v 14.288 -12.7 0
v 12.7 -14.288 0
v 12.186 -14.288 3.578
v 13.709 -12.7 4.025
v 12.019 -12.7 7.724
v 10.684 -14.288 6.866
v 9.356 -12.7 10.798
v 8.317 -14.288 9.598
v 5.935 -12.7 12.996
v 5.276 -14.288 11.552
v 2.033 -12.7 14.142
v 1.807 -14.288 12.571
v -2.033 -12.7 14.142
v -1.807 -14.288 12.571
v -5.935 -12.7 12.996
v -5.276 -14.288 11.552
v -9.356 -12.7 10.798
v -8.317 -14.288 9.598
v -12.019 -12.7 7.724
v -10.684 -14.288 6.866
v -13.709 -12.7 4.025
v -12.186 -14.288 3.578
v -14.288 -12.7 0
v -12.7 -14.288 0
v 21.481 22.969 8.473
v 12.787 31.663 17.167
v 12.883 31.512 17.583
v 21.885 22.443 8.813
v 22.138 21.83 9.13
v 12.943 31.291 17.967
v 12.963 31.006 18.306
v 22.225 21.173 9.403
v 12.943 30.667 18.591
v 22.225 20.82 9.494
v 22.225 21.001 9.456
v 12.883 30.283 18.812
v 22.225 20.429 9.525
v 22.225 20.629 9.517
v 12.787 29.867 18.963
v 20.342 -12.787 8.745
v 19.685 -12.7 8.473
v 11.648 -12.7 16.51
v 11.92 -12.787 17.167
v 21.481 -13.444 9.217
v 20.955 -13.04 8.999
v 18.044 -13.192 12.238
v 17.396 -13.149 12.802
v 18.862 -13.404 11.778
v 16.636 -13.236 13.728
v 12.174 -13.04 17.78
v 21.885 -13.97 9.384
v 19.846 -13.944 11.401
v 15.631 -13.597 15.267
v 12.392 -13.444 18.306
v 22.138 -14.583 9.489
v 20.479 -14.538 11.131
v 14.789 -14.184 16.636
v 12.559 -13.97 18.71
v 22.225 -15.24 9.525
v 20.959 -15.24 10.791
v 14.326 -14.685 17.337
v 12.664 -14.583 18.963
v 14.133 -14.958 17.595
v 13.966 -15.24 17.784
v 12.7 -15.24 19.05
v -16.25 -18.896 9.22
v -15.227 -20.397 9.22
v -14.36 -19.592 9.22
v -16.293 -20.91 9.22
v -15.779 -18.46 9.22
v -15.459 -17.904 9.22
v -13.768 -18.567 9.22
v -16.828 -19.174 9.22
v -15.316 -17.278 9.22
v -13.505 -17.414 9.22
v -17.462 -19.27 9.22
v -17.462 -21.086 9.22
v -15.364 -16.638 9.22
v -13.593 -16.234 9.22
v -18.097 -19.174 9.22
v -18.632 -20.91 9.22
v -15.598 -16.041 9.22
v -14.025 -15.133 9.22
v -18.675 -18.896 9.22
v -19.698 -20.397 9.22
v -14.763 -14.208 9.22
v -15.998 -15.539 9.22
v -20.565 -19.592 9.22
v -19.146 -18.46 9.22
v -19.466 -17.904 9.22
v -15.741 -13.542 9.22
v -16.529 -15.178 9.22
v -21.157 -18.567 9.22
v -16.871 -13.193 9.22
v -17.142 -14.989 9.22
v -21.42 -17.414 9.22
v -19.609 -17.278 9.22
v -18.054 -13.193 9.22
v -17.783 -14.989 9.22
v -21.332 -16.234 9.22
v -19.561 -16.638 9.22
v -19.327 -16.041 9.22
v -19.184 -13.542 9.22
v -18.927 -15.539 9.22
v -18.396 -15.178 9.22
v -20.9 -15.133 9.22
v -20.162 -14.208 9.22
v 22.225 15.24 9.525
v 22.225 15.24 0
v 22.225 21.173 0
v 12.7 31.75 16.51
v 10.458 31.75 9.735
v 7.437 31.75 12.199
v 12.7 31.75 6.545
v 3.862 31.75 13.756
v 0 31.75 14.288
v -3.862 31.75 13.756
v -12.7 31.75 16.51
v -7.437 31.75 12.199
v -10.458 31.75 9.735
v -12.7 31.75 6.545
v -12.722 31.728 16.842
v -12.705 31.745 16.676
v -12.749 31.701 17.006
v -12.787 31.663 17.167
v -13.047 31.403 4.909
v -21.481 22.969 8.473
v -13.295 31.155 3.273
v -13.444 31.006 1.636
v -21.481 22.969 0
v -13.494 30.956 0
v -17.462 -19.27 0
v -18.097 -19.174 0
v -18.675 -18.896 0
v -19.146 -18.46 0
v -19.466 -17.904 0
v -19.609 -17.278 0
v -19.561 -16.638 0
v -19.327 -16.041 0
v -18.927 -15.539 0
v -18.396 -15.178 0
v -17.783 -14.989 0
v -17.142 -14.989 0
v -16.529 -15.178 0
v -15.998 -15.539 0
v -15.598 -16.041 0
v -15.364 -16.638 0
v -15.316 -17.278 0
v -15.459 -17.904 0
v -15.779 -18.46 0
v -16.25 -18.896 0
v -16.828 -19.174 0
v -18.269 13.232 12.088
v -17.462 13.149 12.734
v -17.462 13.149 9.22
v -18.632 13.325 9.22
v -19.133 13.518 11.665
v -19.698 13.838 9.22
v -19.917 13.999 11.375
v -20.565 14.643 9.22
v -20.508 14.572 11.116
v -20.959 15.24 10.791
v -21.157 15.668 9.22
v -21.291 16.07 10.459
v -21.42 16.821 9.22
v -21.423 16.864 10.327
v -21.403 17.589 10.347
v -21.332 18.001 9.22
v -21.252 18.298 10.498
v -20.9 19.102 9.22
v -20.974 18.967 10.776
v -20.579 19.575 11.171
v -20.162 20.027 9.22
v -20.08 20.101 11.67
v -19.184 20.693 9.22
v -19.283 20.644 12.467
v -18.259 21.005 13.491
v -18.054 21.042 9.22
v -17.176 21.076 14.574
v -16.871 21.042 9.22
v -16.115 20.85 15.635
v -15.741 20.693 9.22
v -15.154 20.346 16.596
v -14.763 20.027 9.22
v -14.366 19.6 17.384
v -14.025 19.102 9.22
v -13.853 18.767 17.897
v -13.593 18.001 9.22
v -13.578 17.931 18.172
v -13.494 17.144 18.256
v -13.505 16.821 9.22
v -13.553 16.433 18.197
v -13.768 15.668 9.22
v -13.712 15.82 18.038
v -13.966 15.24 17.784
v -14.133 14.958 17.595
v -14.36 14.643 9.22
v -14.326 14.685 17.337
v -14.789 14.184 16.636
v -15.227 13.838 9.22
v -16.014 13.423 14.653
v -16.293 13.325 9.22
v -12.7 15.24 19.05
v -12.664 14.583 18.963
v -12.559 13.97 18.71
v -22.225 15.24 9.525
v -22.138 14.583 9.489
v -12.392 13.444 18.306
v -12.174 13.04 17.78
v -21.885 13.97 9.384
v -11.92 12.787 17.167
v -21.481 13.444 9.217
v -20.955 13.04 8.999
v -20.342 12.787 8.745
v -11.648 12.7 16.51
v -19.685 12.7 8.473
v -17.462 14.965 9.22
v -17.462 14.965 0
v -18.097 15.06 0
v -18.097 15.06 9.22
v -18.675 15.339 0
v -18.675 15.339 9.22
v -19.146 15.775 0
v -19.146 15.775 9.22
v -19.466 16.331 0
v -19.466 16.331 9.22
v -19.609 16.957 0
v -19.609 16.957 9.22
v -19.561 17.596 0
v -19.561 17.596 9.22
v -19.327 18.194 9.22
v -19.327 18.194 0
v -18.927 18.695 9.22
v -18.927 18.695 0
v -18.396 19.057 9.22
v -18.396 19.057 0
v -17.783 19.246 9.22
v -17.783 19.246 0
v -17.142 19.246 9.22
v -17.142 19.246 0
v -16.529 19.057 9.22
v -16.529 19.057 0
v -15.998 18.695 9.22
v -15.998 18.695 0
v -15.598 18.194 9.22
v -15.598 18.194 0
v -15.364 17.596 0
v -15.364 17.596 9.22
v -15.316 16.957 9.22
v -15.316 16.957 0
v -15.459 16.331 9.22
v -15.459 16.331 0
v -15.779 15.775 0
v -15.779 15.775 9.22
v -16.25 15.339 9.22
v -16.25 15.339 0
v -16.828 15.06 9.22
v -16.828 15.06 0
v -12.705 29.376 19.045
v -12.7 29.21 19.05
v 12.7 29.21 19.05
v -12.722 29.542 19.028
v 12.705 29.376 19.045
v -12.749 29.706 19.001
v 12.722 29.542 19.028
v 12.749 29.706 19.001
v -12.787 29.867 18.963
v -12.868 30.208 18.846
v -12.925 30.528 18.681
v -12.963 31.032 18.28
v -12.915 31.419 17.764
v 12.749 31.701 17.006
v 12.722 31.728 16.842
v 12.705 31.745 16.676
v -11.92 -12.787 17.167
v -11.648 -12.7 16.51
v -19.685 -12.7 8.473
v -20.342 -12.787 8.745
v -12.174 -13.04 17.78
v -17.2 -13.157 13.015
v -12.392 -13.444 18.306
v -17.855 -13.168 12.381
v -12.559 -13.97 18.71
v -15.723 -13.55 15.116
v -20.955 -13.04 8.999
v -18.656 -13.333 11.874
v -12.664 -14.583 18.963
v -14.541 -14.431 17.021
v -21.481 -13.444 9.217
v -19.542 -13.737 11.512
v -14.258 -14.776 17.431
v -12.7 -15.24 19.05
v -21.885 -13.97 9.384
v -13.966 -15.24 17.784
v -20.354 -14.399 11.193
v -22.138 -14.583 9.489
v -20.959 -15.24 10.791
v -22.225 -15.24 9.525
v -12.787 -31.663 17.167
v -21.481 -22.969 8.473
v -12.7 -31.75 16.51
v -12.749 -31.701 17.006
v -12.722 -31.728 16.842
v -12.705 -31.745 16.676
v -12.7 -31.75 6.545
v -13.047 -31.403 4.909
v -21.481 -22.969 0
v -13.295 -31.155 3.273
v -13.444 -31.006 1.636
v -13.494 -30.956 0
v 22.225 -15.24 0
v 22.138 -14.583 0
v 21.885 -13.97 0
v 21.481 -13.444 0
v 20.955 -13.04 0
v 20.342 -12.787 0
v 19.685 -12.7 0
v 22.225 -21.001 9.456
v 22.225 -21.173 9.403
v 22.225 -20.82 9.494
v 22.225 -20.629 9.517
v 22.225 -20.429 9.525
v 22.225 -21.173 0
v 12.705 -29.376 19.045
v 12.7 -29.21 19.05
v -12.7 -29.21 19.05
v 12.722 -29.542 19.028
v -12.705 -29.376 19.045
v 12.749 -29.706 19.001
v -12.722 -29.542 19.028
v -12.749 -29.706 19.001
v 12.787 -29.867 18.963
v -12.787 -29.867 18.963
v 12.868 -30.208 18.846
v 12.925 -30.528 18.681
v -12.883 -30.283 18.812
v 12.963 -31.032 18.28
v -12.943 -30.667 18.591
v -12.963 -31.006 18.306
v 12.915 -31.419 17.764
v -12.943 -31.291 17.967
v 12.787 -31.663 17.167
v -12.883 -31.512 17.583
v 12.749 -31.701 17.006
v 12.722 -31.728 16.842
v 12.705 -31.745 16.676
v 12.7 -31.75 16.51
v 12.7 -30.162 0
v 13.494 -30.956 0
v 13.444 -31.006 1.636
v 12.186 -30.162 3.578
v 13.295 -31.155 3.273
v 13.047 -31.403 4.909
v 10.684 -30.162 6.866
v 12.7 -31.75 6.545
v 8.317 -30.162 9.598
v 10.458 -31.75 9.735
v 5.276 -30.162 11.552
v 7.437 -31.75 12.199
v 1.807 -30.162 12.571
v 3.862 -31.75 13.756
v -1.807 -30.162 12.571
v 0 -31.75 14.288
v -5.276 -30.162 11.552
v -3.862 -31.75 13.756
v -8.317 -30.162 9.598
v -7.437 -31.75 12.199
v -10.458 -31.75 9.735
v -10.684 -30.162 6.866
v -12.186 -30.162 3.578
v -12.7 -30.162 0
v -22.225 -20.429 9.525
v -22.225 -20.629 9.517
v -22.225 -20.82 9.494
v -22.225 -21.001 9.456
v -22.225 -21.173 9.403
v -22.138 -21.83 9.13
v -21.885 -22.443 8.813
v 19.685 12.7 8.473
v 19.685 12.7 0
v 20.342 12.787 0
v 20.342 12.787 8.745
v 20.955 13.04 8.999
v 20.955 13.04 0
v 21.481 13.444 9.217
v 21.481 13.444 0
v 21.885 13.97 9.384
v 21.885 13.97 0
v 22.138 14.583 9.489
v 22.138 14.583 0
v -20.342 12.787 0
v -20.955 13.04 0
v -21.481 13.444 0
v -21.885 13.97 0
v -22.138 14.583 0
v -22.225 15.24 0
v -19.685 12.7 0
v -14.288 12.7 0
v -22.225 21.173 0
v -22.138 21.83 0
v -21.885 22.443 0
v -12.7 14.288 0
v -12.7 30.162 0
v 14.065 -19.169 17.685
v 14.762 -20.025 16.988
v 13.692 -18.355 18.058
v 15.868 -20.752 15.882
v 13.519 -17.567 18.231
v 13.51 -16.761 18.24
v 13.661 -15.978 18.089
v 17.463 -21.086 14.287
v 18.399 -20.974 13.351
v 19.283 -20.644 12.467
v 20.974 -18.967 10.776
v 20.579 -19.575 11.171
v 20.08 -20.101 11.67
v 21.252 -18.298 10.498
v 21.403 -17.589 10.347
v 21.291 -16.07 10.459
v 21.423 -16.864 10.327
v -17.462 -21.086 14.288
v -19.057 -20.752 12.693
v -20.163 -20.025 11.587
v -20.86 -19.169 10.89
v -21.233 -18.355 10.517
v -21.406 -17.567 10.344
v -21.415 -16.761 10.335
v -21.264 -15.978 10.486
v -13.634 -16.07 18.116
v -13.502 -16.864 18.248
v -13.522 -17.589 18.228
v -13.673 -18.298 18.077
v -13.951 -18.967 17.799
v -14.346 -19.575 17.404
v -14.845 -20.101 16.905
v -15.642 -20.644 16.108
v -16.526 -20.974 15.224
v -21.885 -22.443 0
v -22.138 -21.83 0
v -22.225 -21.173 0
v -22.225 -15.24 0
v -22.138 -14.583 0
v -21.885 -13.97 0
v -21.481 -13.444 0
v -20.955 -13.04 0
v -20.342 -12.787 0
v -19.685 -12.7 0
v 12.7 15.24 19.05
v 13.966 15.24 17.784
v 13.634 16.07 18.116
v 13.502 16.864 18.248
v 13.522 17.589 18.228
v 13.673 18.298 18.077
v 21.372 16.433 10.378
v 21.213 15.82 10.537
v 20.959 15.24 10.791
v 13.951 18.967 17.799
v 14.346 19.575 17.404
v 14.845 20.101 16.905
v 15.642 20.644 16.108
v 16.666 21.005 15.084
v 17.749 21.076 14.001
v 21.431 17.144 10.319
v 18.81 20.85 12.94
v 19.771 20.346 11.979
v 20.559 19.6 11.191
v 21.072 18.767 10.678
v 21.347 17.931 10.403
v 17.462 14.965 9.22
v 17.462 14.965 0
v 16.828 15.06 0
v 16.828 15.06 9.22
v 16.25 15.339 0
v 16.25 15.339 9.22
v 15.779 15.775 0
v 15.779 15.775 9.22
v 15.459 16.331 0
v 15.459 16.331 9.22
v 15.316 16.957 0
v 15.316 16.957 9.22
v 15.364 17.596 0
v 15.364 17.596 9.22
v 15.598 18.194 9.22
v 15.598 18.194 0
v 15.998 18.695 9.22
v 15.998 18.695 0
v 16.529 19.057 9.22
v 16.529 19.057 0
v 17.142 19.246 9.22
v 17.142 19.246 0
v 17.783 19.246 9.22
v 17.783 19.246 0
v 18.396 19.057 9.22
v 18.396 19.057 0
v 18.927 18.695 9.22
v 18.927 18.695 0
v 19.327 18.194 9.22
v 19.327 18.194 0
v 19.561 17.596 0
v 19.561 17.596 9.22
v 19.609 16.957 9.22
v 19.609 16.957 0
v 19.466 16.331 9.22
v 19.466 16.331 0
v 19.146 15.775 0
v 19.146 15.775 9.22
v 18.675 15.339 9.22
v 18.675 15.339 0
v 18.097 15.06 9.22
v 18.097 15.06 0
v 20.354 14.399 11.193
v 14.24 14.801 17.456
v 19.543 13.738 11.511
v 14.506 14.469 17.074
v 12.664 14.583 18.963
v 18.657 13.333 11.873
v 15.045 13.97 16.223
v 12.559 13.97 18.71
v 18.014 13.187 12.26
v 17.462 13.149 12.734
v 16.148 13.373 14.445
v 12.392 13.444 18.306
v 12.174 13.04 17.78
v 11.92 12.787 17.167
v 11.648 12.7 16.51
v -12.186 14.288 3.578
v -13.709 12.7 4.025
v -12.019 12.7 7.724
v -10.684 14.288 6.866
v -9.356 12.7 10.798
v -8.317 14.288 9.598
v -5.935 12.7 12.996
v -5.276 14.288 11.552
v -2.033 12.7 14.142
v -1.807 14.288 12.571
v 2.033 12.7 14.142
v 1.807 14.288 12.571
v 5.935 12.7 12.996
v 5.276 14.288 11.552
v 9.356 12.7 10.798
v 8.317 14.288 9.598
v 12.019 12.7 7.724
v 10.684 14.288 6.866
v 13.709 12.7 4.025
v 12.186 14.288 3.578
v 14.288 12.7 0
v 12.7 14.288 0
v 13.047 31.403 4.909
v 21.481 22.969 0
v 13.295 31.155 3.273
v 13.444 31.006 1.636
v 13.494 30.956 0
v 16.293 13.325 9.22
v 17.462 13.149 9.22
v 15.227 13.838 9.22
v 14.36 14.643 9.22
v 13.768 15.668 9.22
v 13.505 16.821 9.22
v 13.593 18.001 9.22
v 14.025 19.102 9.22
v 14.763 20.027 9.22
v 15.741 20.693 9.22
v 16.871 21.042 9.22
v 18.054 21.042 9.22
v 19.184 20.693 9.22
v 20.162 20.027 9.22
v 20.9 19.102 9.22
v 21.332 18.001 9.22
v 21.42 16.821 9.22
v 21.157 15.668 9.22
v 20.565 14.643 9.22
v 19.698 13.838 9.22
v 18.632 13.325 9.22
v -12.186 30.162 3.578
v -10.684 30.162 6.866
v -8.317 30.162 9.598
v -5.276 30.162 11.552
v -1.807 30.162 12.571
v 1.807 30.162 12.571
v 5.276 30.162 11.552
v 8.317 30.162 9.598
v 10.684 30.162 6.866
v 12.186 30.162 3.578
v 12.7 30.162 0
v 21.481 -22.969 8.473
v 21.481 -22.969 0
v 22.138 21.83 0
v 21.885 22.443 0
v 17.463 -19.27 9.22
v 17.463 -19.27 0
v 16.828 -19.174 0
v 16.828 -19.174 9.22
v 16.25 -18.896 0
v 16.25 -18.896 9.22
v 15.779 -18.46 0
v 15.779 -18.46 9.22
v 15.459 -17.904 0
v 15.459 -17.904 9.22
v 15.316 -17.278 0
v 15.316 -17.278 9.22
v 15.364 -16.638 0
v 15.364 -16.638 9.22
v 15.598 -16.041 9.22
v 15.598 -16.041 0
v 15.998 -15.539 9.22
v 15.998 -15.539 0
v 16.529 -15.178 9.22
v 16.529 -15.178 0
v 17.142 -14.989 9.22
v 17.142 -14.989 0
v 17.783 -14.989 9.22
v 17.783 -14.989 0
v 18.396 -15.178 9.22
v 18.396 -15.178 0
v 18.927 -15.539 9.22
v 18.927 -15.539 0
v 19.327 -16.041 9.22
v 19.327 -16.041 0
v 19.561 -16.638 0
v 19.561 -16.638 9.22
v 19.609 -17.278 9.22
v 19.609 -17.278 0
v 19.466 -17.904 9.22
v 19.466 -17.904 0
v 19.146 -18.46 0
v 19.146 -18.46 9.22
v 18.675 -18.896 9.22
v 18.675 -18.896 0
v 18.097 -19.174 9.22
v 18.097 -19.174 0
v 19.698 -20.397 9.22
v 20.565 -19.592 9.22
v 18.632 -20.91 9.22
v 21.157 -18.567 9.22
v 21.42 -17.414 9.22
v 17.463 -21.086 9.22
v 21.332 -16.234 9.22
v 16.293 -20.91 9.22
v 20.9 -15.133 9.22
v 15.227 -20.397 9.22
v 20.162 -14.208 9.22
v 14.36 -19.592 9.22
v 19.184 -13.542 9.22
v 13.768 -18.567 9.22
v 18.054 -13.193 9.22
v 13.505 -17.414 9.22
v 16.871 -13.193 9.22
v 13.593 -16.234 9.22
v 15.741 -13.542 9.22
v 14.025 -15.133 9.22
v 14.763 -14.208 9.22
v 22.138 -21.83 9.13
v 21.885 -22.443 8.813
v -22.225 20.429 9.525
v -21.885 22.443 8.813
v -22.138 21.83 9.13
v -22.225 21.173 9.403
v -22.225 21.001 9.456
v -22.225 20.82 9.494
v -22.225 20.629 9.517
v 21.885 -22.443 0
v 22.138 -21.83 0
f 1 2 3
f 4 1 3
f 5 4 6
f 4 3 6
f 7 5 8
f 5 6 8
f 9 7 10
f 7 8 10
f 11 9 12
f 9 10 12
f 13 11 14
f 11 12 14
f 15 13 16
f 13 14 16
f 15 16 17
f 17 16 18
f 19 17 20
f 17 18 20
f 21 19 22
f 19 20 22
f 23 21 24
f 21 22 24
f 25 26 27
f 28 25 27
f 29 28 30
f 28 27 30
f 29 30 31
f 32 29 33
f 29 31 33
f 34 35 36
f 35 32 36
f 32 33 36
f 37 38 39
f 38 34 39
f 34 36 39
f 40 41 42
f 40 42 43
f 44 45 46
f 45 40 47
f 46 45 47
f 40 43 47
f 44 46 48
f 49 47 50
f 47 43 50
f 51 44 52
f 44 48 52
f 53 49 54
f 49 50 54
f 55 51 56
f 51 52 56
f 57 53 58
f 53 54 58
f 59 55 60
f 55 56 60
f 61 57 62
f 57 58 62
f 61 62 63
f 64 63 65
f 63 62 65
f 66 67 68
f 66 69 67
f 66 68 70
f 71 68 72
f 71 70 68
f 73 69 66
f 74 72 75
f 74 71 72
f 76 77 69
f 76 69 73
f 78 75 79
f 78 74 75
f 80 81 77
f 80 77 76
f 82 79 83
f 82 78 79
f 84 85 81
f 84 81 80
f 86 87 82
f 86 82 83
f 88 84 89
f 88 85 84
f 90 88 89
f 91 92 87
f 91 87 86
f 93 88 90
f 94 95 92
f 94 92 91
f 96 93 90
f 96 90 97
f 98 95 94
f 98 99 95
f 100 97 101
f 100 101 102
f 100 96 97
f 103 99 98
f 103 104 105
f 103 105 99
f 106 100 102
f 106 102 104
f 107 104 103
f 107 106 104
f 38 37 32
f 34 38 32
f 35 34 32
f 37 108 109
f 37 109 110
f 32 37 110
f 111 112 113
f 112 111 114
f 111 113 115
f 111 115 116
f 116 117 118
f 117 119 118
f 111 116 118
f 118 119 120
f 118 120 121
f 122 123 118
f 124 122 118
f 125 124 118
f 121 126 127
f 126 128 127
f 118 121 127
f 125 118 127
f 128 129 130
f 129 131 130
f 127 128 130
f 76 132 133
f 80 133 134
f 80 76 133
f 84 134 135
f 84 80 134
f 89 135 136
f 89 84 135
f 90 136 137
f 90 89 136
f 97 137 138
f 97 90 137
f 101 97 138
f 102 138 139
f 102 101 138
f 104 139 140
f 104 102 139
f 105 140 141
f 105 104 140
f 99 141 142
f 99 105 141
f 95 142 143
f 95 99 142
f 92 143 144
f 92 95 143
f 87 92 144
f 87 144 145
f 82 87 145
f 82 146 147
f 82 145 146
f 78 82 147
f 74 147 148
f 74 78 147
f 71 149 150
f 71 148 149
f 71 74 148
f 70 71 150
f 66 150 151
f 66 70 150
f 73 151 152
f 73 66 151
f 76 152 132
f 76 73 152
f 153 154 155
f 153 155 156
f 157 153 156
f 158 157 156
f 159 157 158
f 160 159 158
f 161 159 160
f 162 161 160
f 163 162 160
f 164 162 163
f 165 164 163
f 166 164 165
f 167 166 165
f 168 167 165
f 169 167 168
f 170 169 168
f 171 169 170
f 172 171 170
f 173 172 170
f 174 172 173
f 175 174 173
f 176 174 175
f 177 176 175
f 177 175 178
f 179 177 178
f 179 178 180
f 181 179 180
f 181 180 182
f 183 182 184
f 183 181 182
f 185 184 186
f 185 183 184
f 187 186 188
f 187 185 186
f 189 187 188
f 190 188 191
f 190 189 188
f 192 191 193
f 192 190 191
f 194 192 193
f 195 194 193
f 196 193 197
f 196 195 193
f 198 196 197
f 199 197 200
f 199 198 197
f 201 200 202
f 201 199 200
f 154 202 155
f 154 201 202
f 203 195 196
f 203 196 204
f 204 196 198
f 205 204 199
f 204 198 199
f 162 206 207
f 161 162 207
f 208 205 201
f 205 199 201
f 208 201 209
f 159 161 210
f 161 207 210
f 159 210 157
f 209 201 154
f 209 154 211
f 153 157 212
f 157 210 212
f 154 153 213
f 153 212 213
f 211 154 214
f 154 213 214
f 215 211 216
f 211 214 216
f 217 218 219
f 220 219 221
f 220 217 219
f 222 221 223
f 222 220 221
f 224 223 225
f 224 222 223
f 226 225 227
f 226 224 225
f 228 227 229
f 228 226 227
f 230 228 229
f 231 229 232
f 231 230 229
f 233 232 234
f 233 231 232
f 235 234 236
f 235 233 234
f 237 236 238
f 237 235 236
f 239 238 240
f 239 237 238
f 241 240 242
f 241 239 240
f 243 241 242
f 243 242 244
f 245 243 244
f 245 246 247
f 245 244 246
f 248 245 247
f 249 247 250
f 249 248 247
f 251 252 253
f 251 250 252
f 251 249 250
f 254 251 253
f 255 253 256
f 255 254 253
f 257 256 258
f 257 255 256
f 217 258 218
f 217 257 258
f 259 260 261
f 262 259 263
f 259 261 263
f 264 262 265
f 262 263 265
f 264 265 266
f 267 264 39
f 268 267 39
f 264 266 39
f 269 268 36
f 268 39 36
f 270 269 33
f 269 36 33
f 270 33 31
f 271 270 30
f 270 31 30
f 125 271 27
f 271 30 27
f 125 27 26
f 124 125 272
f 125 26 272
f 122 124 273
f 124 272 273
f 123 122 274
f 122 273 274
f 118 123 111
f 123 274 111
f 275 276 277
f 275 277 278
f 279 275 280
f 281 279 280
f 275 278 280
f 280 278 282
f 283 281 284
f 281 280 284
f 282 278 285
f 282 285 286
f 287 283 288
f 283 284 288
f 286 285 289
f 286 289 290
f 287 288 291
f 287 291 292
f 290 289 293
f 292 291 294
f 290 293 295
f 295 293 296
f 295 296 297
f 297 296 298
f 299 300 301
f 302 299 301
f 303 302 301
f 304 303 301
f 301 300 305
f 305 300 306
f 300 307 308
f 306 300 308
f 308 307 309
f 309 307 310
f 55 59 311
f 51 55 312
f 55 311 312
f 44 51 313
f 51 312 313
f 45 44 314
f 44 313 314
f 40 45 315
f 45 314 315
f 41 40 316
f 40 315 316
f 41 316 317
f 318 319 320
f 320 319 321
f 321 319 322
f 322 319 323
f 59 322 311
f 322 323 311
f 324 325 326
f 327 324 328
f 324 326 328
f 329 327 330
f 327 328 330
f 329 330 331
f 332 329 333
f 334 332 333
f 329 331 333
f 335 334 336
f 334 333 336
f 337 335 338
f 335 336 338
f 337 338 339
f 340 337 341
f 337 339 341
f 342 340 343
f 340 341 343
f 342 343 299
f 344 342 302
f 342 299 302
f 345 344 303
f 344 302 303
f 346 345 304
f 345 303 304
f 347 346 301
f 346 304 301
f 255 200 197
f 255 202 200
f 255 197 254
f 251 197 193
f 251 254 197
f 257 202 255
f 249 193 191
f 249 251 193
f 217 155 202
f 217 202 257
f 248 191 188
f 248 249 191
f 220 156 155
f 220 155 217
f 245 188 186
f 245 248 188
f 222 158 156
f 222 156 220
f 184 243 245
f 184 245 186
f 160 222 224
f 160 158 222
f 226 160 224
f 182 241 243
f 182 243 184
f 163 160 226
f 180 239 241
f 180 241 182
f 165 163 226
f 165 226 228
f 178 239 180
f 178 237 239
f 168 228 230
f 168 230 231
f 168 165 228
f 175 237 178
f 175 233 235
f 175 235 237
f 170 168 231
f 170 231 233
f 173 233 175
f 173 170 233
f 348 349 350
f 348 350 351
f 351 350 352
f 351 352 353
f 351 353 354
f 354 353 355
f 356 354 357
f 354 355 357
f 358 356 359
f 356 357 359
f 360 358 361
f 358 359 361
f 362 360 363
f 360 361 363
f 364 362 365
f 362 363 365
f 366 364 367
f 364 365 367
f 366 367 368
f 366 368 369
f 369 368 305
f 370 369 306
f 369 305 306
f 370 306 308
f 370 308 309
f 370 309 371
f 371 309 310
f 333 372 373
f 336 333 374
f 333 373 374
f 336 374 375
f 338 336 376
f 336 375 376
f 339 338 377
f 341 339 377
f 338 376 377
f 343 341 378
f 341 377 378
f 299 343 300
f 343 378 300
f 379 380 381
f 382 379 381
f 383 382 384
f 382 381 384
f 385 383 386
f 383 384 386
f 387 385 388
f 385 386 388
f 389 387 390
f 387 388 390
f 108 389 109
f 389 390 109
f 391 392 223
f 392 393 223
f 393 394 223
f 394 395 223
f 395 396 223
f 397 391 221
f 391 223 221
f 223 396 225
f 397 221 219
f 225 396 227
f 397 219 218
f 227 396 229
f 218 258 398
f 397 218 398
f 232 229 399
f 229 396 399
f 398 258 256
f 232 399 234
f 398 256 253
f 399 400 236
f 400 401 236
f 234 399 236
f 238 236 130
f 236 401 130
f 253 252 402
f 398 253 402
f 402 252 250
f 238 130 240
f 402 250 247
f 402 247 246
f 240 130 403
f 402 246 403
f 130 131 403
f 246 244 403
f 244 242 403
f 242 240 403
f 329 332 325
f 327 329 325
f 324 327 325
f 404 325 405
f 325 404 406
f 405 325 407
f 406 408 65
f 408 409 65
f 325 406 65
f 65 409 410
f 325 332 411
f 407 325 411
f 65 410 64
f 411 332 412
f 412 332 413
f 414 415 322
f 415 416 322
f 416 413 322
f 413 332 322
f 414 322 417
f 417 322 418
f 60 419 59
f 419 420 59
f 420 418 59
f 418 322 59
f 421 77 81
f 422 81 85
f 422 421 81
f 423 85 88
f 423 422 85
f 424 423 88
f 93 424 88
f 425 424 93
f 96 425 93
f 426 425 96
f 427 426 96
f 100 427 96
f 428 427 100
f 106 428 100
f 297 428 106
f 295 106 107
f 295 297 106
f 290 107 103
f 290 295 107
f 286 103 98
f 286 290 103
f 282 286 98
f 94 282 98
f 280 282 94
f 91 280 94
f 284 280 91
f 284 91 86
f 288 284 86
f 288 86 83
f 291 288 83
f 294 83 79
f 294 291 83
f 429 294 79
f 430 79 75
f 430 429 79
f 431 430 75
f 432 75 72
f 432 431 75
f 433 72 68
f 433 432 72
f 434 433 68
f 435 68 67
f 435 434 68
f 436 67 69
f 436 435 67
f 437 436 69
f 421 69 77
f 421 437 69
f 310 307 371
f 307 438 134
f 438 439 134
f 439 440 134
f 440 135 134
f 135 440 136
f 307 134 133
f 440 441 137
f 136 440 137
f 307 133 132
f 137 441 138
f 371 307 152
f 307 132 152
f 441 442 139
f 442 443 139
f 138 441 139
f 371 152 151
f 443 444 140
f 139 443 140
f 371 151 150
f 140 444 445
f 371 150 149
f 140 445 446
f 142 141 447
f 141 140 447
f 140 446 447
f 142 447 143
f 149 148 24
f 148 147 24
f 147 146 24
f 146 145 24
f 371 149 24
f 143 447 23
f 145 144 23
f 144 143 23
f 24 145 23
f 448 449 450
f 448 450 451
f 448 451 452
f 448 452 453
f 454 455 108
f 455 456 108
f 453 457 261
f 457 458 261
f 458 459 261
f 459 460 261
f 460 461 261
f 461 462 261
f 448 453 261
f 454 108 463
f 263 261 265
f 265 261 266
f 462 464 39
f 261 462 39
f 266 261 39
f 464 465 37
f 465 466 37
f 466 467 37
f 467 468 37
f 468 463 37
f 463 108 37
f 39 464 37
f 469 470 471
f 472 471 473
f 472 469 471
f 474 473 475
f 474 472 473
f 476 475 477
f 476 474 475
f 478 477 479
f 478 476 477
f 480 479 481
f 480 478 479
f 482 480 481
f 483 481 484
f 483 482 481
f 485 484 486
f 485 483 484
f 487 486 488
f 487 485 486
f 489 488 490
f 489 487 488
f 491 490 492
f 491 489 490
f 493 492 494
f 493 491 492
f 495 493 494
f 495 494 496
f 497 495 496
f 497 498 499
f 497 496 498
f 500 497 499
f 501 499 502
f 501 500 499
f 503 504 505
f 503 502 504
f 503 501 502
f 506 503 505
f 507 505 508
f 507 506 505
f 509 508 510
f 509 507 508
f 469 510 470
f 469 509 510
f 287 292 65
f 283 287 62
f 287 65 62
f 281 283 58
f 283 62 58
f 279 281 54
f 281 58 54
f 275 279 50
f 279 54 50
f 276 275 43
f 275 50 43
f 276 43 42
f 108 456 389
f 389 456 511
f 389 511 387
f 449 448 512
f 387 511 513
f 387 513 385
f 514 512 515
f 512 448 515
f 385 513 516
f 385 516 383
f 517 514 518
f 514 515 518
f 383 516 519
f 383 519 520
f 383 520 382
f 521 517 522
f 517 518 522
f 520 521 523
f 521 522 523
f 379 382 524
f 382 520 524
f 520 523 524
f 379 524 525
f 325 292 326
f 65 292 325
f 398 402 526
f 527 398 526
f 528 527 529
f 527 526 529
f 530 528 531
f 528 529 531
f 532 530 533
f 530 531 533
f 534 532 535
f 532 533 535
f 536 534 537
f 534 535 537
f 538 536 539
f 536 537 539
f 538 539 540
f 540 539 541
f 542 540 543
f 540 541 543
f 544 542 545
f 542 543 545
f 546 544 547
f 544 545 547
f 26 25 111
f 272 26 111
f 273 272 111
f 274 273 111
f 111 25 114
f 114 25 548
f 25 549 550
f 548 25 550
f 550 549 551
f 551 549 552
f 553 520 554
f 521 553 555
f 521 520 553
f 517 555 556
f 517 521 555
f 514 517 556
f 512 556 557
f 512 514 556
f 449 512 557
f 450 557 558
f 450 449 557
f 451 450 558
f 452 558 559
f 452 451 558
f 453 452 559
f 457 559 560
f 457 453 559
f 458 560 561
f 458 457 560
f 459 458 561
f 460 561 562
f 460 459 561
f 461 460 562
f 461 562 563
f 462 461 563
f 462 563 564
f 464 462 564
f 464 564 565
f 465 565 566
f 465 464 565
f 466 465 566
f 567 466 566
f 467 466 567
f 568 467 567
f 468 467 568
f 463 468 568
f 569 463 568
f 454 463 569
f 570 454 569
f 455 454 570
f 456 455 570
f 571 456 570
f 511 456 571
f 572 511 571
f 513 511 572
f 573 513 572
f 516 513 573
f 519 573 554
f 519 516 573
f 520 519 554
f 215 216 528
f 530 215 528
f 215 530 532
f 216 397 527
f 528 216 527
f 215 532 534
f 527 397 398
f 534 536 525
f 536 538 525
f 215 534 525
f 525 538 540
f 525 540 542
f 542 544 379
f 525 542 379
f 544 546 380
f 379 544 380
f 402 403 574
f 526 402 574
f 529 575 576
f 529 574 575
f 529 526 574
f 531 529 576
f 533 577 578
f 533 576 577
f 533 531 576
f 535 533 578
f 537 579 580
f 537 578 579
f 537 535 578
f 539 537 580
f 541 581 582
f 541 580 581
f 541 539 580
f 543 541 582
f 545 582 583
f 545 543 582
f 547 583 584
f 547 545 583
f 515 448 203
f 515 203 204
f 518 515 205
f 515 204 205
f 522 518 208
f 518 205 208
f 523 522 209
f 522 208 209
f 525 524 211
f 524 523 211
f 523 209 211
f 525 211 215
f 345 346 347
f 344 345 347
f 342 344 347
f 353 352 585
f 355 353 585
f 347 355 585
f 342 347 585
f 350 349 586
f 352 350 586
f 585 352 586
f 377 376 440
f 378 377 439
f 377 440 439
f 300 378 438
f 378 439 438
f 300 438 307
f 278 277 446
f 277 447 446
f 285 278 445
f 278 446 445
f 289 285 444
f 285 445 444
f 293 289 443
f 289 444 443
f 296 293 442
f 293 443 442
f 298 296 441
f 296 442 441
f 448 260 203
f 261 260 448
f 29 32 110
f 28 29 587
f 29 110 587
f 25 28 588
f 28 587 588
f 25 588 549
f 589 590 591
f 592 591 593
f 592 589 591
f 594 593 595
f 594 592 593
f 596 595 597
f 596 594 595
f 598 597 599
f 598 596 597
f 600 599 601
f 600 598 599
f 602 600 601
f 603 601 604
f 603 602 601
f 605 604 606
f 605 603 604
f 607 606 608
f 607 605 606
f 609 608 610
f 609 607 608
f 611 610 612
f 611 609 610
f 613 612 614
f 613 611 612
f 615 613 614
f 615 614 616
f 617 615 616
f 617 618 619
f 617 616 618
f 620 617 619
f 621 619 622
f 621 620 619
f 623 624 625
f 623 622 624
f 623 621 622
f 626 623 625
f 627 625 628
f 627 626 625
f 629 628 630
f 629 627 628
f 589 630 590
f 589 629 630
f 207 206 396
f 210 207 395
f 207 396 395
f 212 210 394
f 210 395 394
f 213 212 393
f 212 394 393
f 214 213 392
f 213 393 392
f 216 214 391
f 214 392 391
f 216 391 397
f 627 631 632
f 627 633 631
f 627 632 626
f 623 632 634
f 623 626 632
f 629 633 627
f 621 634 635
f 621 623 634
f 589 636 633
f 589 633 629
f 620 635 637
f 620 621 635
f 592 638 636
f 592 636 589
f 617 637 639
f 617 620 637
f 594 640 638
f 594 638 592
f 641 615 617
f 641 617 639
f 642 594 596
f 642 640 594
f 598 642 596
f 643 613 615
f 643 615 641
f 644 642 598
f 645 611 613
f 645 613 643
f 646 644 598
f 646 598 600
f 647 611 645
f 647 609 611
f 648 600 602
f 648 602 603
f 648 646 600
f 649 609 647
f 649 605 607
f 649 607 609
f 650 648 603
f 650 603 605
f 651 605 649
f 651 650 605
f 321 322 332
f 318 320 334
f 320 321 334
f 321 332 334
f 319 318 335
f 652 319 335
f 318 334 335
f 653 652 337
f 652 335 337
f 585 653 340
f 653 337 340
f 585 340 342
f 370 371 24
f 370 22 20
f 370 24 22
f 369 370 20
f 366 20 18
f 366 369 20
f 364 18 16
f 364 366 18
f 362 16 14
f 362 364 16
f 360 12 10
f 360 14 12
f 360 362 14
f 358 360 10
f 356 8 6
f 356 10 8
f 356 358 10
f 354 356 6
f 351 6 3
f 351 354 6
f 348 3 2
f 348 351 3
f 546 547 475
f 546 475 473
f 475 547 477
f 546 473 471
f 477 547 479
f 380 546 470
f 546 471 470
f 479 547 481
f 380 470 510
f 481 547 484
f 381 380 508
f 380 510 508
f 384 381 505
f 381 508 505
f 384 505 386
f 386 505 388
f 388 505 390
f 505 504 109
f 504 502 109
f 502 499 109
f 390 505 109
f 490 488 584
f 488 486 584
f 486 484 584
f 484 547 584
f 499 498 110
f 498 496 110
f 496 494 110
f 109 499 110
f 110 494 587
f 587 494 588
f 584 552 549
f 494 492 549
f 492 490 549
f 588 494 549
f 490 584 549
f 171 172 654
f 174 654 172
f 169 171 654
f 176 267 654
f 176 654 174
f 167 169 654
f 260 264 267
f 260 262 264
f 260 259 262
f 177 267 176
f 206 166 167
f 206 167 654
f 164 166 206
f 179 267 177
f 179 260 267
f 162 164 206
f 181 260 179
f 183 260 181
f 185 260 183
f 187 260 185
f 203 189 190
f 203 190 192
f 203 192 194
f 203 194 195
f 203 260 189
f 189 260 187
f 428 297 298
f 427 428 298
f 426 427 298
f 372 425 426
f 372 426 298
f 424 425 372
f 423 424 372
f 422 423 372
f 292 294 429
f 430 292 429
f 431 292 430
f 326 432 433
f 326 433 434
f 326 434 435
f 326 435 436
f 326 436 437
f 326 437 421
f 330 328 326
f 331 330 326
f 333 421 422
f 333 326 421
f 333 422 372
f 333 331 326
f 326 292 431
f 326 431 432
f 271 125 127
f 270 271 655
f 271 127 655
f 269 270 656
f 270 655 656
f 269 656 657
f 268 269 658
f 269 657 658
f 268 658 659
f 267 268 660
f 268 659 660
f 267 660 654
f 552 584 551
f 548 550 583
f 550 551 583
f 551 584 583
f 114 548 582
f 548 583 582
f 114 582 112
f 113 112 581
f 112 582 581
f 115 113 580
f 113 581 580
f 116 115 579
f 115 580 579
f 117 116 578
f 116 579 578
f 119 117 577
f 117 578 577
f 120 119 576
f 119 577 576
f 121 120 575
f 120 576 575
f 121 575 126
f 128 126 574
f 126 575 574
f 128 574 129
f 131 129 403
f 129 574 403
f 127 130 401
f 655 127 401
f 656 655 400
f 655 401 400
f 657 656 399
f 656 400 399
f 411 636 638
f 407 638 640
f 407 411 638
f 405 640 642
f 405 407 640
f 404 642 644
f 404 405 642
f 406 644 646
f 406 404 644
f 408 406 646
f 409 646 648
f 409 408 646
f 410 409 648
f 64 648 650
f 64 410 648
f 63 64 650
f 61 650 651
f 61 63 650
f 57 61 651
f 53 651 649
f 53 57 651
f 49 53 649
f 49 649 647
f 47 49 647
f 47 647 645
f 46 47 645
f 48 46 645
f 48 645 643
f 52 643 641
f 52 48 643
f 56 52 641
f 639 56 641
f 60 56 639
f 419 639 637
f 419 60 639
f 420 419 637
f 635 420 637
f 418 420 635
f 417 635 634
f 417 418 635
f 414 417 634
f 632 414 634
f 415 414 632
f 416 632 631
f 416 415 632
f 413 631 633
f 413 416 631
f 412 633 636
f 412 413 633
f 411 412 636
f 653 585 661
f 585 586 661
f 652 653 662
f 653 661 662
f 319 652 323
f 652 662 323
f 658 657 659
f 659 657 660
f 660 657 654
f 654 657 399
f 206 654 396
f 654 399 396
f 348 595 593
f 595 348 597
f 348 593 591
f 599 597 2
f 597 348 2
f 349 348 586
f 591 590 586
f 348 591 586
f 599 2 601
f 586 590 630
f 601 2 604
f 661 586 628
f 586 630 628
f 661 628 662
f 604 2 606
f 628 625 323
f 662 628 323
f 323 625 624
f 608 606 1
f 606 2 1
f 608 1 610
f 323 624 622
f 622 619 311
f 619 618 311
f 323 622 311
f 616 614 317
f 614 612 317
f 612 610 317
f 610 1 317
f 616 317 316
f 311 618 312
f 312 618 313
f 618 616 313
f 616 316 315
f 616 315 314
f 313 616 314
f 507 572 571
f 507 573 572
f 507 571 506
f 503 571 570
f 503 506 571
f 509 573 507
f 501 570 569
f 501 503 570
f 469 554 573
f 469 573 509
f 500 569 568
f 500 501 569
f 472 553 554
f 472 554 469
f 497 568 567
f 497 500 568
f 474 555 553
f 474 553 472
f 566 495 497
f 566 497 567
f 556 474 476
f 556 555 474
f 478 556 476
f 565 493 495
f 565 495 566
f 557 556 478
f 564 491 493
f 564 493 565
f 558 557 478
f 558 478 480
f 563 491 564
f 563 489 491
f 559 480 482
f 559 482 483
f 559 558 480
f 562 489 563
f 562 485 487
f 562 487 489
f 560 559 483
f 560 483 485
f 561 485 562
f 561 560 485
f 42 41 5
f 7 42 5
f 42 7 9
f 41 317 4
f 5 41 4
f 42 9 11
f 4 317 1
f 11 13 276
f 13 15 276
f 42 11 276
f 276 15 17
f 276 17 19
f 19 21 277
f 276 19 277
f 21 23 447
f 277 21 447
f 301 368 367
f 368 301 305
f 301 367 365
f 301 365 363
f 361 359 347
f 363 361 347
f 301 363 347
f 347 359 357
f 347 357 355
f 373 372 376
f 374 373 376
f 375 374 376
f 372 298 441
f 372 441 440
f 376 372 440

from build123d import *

# Parameters (mm, degrees)
BOSS_EXTRUDE1_DEPTH                         = 19.05
BOSS_EXTRUDE1_2_DEPTH                       = 19.05
CUT_EXTRUDE1_DEPTH                          = 70.922121857
CUT_EXTRUDE1_DEPTH_BACK                     = 70.922121857
SKETCH2_R                                   = 12.7
CHAMFER1_SIZE                               = 9.525
CHAMFER2_SIZE                               = 9.525
CHAMFER3_SIZE                               = 1.5875
CHAMFER4_SIZE                               = 1.5875
FILLET1_R                                   = 2.54
FILLET2_R                                   = 2.54
CBORE_FOR_6_BINDING_HEAD_MACHINE_SC_2_COUNT = 2
CBORE_FOR_6_BINDING_HEAD_MACHINE_SC_2_PITCH = 34.234947664
CBORE_FOR_6_BINDING_HEAD_MACHINE_SC_3_COUNT = 2
CBORE_FOR_6_BINDING_HEAD_MACHINE_SC_3_PITCH = 34.925
CBORE_FOR_6_BINDING_HEAD_MACHINE_SC_4_COUNT = 2
CBORE_FOR_6_BINDING_HEAD_MACHINE_SC_4_PITCH = 48.905902165


with BuildPart() as part:
    # Sketch1 → Boss-Extrude1 (new body)
    with BuildSketch(Plane.XY):
        Polygon((22.225, -12.7), (-22.225, -12.7), (-22.225, -22.225), (-12.7, -31.75), (12.7, -31.75), (22.225, -22.225), align=None)
    extrude(amount=BOSS_EXTRUDE1_DEPTH)


with BuildPart() as body_2:
    # Sketch1 → Boss-Extrude1 2 (new body)
    with BuildSketch(Plane.XY):
        Polygon((-22.225, 22.225), (-22.225, 12.7), (22.225, 12.7), (22.225, 22.225), (12.7, 31.75), (-12.7, 31.75), align=None)
    extrude(amount=BOSS_EXTRUDE1_2_DEPTH)


with BuildPart() as cut_extrude1_tool:
    # Sketch2 → Cut-Extrude1 (new, two sides: drawn at the far end of the back side and taken through both)
    with BuildSketch(Plane.ZX.offset(31.75).offset(-CUT_EXTRUDE1_DEPTH_BACK)):
        Circle(SKETCH2_R)
    extrude(amount=CUT_EXTRUDE1_DEPTH + CUT_EXTRUDE1_DEPTH_BACK)


with BuildPart() as part_1:
    add(part.part)

    # Cut-Extrude1: cut by cut_extrude1_tool
    add(cut_extrude1_tool.part, mode=Mode.SUBTRACT)

    # Chamfer2
    chamfer2_edges = [part_1.edges().sort_by_distance(p)[0] for p in [
        (22.225, -17.4625, 19.05),
        (-22.225, -17.4625, 19.05),
    ]]
    chamfer(chamfer2_edges, length=CHAMFER2_SIZE)

    # Chamfer3
    chamfer3_edges = [part_1.edges().sort_by_distance(p)[0] for p in [
        (0, -31.75, 12.7),
        (0, -12.7, 12.7),
    ]]
    chamfer(chamfer3_edges, length=CHAMFER3_SIZE)

    # Fillet1
    # the kernel refuses this fillet: 2.54 mm, written as the material it takes off along each edge
    with BuildSketch(Plane(origin=(-19.05, -31.75, 19.05), x_dir=(0, 1, 0), z_dir=(1, 0, 0))) as fillet1_piece_1:
        with BuildLine():
            CenterArc((FILLET1_R, -FILLET1_R), FILLET1_R, 90, 90)
            Line((0, -FILLET1_R), (0, 0))
            Line((0, 0), (FILLET1_R, 0))
        make_face()
    extrude(amount=38.1, mode=Mode.SUBTRACT)
    with BuildSketch(Plane(origin=(19.05, -12.7, 19.05), x_dir=(0, 0, -1), z_dir=(-1, 0, 0))) as fillet1_piece_2:
        with BuildLine():
            CenterArc((FILLET1_R, FILLET1_R), FILLET1_R, 180, 90)
            Line((0, FILLET1_R), (0, 0))
            Line((0, 0), (FILLET1_R, 0))
        make_face()
    extrude(amount=38.1, mode=Mode.SUBTRACT)
    with BuildSketch(Plane(origin=(-22.225, -12.7, -6.35), x_dir=(1, 0, 0), z_dir=(0, 0, 1))) as fillet1_piece_3:
        with BuildLine():
            CenterArc((FILLET1_R, -FILLET1_R), FILLET1_R, 90, 90)
            Line((0, -FILLET1_R), (0, 0))
            Line((0, 0), (FILLET1_R, 0))
        make_face()
    extrude(amount=22.225, mode=Mode.SUBTRACT)
    with BuildSketch(Plane(origin=(22.225, -12.7, -6.35), x_dir=(-1, 0, 0), z_dir=(0, 0, 1))) as fillet1_piece_4:
        with BuildLine():
            CenterArc((FILLET1_R, FILLET1_R), FILLET1_R, 180, 90)
            Line((0, FILLET1_R), (0, 0))
            Line((0, 0), (FILLET1_R, 0))
        make_face()
    extrude(amount=22.225, mode=Mode.SUBTRACT)
    with BuildSketch(Plane(origin=(-26.715128061, -12.7, 5.034871939), x_dir=(0.7071067811865475, 0, -0.7071067811865475), z_dir=(0.7071067811865476, 0, 0.7071067811865476)), Plane(origin=(8.209871939, -12.7, 23.540128061), x_dir=(-0.7071067811865476, 0, -0.7071067811865476), z_dir=(0.7071067811865476, 0, -0.7071067811865476))) as fillet1_piece_5:
        with BuildLine():
            CenterArc((FILLET1_R, -FILLET1_R), FILLET1_R, 90, 90)
            Line((0, -FILLET1_R), (0, 0))
            Line((0, 0), (FILLET1_R, 0))
        make_face()
    extrude(amount=26.170384182, mode=Mode.SUBTRACT)
    with BuildSketch(Plane(origin=(22.225, -22.225, -2.630256121), x_dir=(0, 1, 0), z_dir=(0, 0, 1))) as fillet1_piece_6:
        with BuildLine():
            CenterArc((FILLET1_R * 0.414213562373, FILLET1_R), FILLET1_R, 225, 45)
            Line((-FILLET1_R * 0.292893218813, FILLET1_R * 0.292893218813), (0, 0))
            Line((0, 0), (FILLET1_R * 0.414213562373, 0))
        make_face()
    extrude(amount=14.785512242, mode=Mode.SUBTRACT)
    with BuildSketch(Plane(origin=(10.583333333, -33.866666667, 21.166666667), x_dir=(-0.4082482904638614, 0.8164965809277265, 0.40824829046386385), z_dir=(0.5773502691896262, 0.5773502691896252, -0.577350269189626)), Plane(origin=(-24.341666667, -20.108333333, 7.408333333), x_dir=(0.4082482904638628, 0.8164965809277268, 0.4082482904638616), z_dir=(0.5773502691896265, -0.5773502691896246, 0.5773502691896263))) as fillet1_piece_7:
        with BuildLine():
            CenterArc((FILLET1_R * 0.57735026919, -FILLET1_R), FILLET1_R, 90, 60)
            Line((-FILLET1_R * 0.288675134595, -FILLET1_R * 0.5), (0, 0))
            Line((0, 0), (FILLET1_R * 0.57735026919, 0))
        make_face()
    extrude(amount=23.830132361, mode=Mode.SUBTRACT)
    with BuildSketch(Plane(origin=(-22.225, -22.225, -2.630256121), x_dir=(0, 1, 0), z_dir=(0, 0, 1))) as fillet1_piece_8:
        with BuildLine():
            CenterArc((FILLET1_R * 0.414213562373, -FILLET1_R), FILLET1_R, 90, 45)
            Line((-FILLET1_R * 0.292893218813, -FILLET1_R * 0.292893218813), (0, 0))
            Line((0, 0), (FILLET1_R * 0.414213562373, 0))
        make_face()
    extrude(amount=14.785512242, mode=Mode.SUBTRACT)


with BuildPart() as body_2_1:
    add(body_2.part)

    # Cut-Extrude1: cut by cut_extrude1_tool
    add(cut_extrude1_tool.part, mode=Mode.SUBTRACT)

    # Chamfer1
    chamfer1_edges = [body_2_1.edges().sort_by_distance(p)[0] for p in [
        (22.225, 17.4625, 19.05),
        (-22.225, 17.4625, 19.05),
    ]]
    chamfer(chamfer1_edges, length=CHAMFER1_SIZE)

    # Chamfer4
    chamfer4_edges = [body_2_1.edges().sort_by_distance(p)[0] for p in [
        (0, 12.7, 12.7),
        (0, 31.75, 12.7),
    ]]
    chamfer(chamfer4_edges, length=CHAMFER4_SIZE)

    # Fillet2
    # the kernel refuses this fillet: 2.54 mm, written as the material it takes off along each edge
    with BuildSketch(Plane(origin=(-19.05, 12.7, 19.05), x_dir=(0, 0, -1), z_dir=(1, 0, 0)), Plane(origin=(19.05, 31.75, 19.05), x_dir=(0, 0, -1), z_dir=(-1, 0, 0))) as fillet2_piece_1:
        with BuildLine():
            CenterArc((FILLET2_R, FILLET2_R), FILLET2_R, 180, 90)
            Line((0, FILLET2_R), (0, 0))
            Line((0, 0), (FILLET2_R, 0))
        make_face()
    extrude(amount=38.1, mode=Mode.SUBTRACT)
    with BuildSketch(Plane(origin=(22.225, 22.225, -2.630256121), x_dir=(-0.7071067811865492, 0.7071067811865458, 0), z_dir=(0, 0, 1))) as fillet2_piece_2:
        with BuildLine():
            CenterArc((FILLET2_R * 0.414213562373, FILLET2_R), FILLET2_R, 225, 45)
            Line((-FILLET2_R * 0.292893218813, FILLET2_R * 0.292893218813), (0, 0))
            Line((0, 0), (FILLET2_R * 0.414213562373, 0))
        make_face()
    extrude(amount=14.785512242, mode=Mode.SUBTRACT)
    with BuildSketch(Plane(origin=(10.583333333, 33.866666667, 21.166666667), x_dir=(-0.4082482904638657, 0.4082482904638608, -0.8164965809277257), z_dir=(0.5773502691896262, -0.5773502691896251, -0.5773502691896262)), Plane(origin=(-24.341666667, 20.108333333, 7.408333333), x_dir=(0.4082482904638632, 0.4082482904638632, -0.8164965809277258), z_dir=(0.5773502691896257, 0.5773502691896256, 0.577350269189626))) as fillet2_piece_3:
        with BuildLine():
            CenterArc((FILLET2_R * 0.57735026919, -FILLET2_R), FILLET2_R, 90, 60)
            Line((-FILLET2_R * 0.288675134595, -FILLET2_R * 0.5), (0, 0))
            Line((0, 0), (FILLET2_R * 0.57735026919, 0))
        make_face()
    extrude(amount=23.830132361, mode=Mode.SUBTRACT)
    with BuildSketch(Plane(origin=(22.225, 12.7, -6.35), x_dir=(-1, 0, 0), z_dir=(0, 0, 1)), Plane(origin=(-22.225, 12.7, -6.35), x_dir=(0, 1, 0), z_dir=(0, 0, 1))) as fillet2_piece_4:
        with BuildLine():
            CenterArc((FILLET2_R, -FILLET2_R), FILLET2_R, 90, 90)
            Line((0, -FILLET2_R), (0, 0))
            Line((0, 0), (FILLET2_R, 0))
        make_face()
    extrude(amount=22.225, mode=Mode.SUBTRACT)
    with BuildSketch(Plane(origin=(-26.715128061, 12.7, 5.034871939), x_dir=(0, 1, 0), z_dir=(0.7071067811865476, 0, 0.7071067811865476))) as fillet2_piece_5:
        with BuildLine():
            CenterArc((FILLET2_R, -FILLET2_R), FILLET2_R, 90, 90)
            Line((0, -FILLET2_R), (0, 0))
            Line((0, 0), (FILLET2_R, 0))
        make_face()
    extrude(amount=26.170384182, mode=Mode.SUBTRACT)
    with BuildSketch(Plane(origin=(8.209871939, 12.7, 23.540128061), x_dir=(-0.7071067811865475, 0, -0.7071067811865475), z_dir=(0.7071067811865476, 0, -0.7071067811865476))) as fillet2_piece_6:
        with BuildLine():
            CenterArc((FILLET2_R, FILLET2_R), FILLET2_R, 180, 90)
            Line((0, FILLET2_R), (0, 0))
            Line((0, 0), (FILLET2_R, 0))
        make_face()
    extrude(amount=26.170384182, mode=Mode.SUBTRACT)
    with BuildSketch(Plane(origin=(-22.225, 22.225, -2.630256121), x_dir=(0.7071067811865476, 0.7071067811865476, 0), z_dir=(0, 0, 1))) as fillet2_piece_7:
        with BuildLine():
            CenterArc((FILLET2_R * 0.414213562373, -FILLET2_R), FILLET2_R, 90, 45)
            Line((-FILLET2_R * 0.292893218813, -FILLET2_R * 0.292893218813), (0, 0))
            Line((0, 0), (FILLET2_R * 0.414213562373, 0))
        make_face()
    extrude(amount=14.785512242, mode=Mode.SUBTRACT)

    # Sketch4 → CBORE for #6 Binding Head Machine Screw1 (revolve, cut)
    with BuildSketch(Plane(origin=(-17.4625, 17.117473832, 19.05), x_dir=(0, -1, 0), z_dir=(1, 0, 0))):
        Polygon((0, 0), (0, 23.645442612), (2.15265, 22.352), (2.15265, 9.8298), (3.96875, 9.8298), (3.96875, 0), align=None)
    cbore_for_6_binding_head_machine_screw1 = revolve(axis=Axis((-17.4625, 17.117473832, 25.4), (0, 0, -1)), mode=Mode.SUBTRACT)

    # CBORE for _6 Binding Head Machine Sc 3: CBORE for #6 Binding Head Machine Screw1 ×2
    with Locations(*[(i * CBORE_FOR_6_BINDING_HEAD_MACHINE_SC_3_PITCH, 0, 0) for i in range(1, CBORE_FOR_6_BINDING_HEAD_MACHINE_SC_3_COUNT)]):
        add(cbore_for_6_binding_head_machine_screw1, mode=Mode.SUBTRACT)


with BuildPart() as part_2:
    add(part_1.part)

    # CBORE for _6 Binding Head Machine Sc 2: CBORE for #6 Binding Head Machine Screw1 ×2
    with Locations(*[(0, -i * CBORE_FOR_6_BINDING_HEAD_MACHINE_SC_2_PITCH, 0) for i in range(1, CBORE_FOR_6_BINDING_HEAD_MACHINE_SC_2_COUNT)]):
        add(cbore_for_6_binding_head_machine_screw1, mode=Mode.SUBTRACT)

    # CBORE for _6 Binding Head Machine Sc 4: CBORE for #6 Binding Head Machine Screw1 ×2
    with Locations(*[Vector(0.7141264848198602, -0.7000166881430973, 0) * (i * CBORE_FOR_6_BINDING_HEAD_MACHINE_SC_4_PITCH) for i in range(1, CBORE_FOR_6_BINDING_HEAD_MACHINE_SC_4_COUNT)]):
        add(cbore_for_6_binding_head_machine_screw1, mode=Mode.SUBTRACT)


solid = Compound([body_2_1.part, part_2.part])
